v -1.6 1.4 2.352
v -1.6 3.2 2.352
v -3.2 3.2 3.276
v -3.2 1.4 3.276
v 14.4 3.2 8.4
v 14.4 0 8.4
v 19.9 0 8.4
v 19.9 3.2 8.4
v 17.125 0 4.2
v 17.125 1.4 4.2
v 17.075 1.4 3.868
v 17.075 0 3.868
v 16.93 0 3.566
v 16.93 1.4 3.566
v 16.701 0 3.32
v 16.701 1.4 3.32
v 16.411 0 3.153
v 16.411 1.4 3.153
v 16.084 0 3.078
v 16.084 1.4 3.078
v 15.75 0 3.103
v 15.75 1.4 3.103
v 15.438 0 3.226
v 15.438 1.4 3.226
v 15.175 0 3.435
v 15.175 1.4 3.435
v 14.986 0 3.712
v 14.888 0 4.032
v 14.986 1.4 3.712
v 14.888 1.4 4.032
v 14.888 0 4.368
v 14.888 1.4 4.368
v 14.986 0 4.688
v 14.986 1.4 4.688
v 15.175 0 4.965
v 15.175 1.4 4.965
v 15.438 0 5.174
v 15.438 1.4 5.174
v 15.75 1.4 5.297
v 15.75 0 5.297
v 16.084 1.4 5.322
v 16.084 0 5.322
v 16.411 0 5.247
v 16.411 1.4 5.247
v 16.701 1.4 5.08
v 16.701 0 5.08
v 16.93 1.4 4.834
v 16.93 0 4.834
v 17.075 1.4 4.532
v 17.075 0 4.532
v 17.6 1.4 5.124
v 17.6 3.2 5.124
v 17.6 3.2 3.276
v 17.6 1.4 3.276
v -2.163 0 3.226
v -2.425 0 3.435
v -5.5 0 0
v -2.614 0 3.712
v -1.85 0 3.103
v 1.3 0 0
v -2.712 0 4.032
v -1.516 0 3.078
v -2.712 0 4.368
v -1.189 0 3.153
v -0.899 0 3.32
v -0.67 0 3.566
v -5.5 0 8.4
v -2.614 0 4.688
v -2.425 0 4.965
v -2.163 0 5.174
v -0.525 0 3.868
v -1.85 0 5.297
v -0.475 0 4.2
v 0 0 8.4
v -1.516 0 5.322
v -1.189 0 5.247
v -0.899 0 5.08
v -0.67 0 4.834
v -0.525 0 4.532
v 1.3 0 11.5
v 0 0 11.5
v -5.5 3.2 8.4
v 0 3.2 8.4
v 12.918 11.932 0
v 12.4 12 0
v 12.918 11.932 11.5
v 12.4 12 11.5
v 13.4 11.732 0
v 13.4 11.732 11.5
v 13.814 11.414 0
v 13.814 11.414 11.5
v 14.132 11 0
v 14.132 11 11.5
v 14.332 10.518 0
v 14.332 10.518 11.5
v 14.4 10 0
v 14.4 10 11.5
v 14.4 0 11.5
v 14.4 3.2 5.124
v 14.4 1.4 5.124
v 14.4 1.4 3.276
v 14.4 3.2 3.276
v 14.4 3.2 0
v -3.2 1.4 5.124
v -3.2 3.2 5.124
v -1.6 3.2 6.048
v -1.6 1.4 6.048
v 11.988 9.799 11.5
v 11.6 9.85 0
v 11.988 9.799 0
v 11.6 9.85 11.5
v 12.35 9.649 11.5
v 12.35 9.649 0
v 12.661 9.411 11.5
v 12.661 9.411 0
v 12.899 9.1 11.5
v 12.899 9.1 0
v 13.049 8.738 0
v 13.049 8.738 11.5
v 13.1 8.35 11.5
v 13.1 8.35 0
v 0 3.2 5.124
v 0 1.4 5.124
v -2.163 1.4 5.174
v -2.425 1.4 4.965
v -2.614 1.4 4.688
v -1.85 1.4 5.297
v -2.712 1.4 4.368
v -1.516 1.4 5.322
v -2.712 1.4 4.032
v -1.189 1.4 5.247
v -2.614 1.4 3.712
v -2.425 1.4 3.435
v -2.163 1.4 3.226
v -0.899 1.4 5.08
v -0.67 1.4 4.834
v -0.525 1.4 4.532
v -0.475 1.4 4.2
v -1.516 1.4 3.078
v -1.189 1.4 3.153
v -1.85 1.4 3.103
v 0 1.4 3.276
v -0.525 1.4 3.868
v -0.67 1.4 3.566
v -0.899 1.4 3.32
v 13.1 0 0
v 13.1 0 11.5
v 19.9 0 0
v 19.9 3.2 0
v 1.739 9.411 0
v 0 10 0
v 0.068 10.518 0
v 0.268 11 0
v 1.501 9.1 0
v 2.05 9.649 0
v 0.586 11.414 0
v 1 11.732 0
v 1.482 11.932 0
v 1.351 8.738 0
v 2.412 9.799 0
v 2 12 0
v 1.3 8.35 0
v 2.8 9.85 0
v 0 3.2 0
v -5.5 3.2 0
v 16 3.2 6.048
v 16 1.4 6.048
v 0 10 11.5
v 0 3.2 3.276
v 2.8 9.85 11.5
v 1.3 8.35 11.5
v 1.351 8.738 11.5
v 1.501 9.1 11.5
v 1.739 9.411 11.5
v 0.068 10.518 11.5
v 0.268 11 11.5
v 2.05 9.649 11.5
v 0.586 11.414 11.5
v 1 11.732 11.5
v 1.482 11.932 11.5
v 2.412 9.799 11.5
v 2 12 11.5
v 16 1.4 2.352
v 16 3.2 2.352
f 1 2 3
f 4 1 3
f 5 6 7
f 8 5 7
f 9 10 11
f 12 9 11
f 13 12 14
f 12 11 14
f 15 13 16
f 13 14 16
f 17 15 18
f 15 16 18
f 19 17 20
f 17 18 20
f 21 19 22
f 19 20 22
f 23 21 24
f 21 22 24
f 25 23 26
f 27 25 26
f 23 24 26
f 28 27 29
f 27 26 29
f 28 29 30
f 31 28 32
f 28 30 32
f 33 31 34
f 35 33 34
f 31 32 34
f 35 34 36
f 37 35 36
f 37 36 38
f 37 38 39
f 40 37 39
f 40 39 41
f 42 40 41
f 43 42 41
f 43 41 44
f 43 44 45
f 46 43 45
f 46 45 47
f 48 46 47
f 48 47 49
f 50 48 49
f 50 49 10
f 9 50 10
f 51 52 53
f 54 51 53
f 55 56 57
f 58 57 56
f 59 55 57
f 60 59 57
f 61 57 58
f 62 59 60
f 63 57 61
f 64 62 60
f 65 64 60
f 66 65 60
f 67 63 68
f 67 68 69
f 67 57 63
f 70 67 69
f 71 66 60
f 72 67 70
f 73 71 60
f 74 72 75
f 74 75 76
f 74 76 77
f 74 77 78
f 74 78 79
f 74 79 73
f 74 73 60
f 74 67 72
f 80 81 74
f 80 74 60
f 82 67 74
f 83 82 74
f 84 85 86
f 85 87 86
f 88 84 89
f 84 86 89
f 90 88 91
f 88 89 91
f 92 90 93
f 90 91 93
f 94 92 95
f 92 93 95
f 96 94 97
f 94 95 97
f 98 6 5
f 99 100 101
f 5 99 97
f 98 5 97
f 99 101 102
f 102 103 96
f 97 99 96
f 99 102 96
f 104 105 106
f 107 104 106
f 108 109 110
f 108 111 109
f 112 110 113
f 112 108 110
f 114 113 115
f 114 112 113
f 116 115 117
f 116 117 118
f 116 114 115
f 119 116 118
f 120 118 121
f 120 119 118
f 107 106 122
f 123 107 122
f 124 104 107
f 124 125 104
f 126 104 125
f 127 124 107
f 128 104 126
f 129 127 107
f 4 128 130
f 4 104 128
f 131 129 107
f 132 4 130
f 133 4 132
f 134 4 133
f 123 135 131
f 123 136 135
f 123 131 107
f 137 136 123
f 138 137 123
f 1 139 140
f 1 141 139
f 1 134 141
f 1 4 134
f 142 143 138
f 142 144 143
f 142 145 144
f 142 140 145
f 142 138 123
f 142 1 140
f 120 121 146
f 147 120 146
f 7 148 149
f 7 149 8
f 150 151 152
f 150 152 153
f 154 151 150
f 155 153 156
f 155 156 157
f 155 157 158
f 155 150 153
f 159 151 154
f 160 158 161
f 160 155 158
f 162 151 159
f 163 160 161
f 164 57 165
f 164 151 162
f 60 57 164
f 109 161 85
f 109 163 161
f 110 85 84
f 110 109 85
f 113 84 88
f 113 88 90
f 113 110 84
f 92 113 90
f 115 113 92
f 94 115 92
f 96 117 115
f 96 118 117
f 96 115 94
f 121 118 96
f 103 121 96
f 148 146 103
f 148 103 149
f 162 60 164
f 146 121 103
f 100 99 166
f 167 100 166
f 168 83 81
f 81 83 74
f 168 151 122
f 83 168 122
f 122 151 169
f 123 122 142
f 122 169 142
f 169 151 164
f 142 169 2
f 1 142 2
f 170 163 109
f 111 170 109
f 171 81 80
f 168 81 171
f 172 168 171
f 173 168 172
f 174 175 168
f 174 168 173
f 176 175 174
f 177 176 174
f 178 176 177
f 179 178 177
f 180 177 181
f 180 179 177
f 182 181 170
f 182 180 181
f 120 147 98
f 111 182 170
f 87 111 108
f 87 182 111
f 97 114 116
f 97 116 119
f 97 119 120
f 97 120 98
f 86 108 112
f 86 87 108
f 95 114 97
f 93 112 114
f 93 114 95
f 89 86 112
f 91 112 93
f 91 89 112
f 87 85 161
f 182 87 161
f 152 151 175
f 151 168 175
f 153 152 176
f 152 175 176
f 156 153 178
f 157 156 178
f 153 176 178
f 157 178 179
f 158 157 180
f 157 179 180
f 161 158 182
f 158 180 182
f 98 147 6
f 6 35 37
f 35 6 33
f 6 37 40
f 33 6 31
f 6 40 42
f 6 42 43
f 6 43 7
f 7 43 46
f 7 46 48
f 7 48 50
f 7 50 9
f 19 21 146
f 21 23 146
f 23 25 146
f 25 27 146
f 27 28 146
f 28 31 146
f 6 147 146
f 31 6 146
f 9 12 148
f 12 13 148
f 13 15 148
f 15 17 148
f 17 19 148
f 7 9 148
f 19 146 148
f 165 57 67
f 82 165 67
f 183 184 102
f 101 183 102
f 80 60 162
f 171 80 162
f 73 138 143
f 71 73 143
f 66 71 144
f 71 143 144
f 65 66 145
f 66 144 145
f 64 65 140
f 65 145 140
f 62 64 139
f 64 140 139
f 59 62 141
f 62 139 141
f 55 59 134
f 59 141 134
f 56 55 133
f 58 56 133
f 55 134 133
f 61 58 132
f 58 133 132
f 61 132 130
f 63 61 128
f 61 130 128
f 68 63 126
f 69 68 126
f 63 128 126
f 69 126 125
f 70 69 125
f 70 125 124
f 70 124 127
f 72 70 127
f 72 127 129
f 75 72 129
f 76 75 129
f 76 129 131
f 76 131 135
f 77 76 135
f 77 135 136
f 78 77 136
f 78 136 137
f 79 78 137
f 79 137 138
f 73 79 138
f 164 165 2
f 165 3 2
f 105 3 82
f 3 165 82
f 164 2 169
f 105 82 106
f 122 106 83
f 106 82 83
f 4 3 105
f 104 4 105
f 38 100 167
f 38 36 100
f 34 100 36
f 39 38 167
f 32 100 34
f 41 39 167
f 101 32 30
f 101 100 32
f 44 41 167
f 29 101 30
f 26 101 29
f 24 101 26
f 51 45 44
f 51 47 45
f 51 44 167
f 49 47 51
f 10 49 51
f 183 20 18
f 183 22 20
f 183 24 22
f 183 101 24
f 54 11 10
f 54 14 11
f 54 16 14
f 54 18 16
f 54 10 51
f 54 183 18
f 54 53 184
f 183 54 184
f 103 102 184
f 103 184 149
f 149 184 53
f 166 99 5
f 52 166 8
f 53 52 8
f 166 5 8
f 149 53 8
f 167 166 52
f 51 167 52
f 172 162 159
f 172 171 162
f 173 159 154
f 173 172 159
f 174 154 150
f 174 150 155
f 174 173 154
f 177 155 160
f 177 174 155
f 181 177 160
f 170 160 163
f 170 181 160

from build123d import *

# Parameters (mm, degrees)
EXTRUDE_1_DEPTH     = 11.5
SKETCH_2_W          = 5.5
SKETCH_2_H          = 8.4
EXTRUDE_2_DEPTH     = 3.2
SKETCH_3_R          = 1.125
CUT_EXTRUDE_1_DEPTH = 4.2
CUT_EXTRUDE_2_DEPTH = 1.8
FILLET_2_R          = 2
FILLET_3_R          = 1.5


with BuildPart() as part:
    # 草图1 → 凸台-拉伸1 (new body)
    with BuildSketch(Plane.XY):
        Polygon((13.1, 0), (14.4, 0), (14.4, 12), (0, 12), (0, 0), (1.3, 0), (1.3, 9.85), (13.1, 9.85), align=None)
    extrude(amount=EXTRUDE_1_DEPTH)

    # 草图2 → 凸台-拉伸2 (add)
    with BuildSketch(Plane.XZ):
        with Locations((-2.75, 4.2)):
            Rectangle(SKETCH_2_W, SKETCH_2_H)
        with Locations((17.15, 4.2)):
            Rectangle(SKETCH_2_W, SKETCH_2_H)
    extrude(amount=-EXTRUDE_2_DEPTH)

    # 草图3 → 切除-拉伸1 (cut, through all)
    with BuildSketch(Plane(origin=(0, 3.2, 0), x_dir=(1, 0, 0), z_dir=(0, 1, 0))):
        with Locations((-1.6, -4.2)):
            Circle(SKETCH_3_R)
        with Locations((16, -4.2)):
            Circle(SKETCH_3_R)
    extrude(amount=-CUT_EXTRUDE_1_DEPTH, mode=Mode.SUBTRACT)

    # 草图4 → 切除-拉伸2 (cut)
    with BuildSketch(Plane(origin=(0, 3.2, 0), x_dir=(1, 0, 0), z_dir=(0, 1, 0))):
        Polygon((-1.6, -2.352479139), (-3.2, -3.276239569), (-3.2, -5.123760431), (-1.6, -6.047520861), (0, -5.123760431), (0, -3.276239569), align=None)
        Polygon((16, -2.352479139), (14.4, -3.276239569), (14.4, -5.123760431), (16, -6.047520861), (17.6, -5.123760431), (17.6, -3.276239569), align=None)
    extrude(amount=-CUT_EXTRUDE_2_DEPTH, mode=Mode.SUBTRACT)

    # 圆角2
    fillet_2_edges = [part.edges().sort_by_distance(p)[0] for p in [
        (0, 12, 5.75),
        (14.4, 12, 5.75),
    ]]
    fillet(fillet_2_edges, radius=FILLET_2_R)

    # 圆角3
    fillet_3_edges = [part.edges().sort_by_distance(p)[0] for p in [
        (13.1, 9.85, 5.75),
        (1.3, 9.85, 5.75),
    ]]
    fillet(fillet_3_edges, radius=FILLET_3_R)


solid = part.part
